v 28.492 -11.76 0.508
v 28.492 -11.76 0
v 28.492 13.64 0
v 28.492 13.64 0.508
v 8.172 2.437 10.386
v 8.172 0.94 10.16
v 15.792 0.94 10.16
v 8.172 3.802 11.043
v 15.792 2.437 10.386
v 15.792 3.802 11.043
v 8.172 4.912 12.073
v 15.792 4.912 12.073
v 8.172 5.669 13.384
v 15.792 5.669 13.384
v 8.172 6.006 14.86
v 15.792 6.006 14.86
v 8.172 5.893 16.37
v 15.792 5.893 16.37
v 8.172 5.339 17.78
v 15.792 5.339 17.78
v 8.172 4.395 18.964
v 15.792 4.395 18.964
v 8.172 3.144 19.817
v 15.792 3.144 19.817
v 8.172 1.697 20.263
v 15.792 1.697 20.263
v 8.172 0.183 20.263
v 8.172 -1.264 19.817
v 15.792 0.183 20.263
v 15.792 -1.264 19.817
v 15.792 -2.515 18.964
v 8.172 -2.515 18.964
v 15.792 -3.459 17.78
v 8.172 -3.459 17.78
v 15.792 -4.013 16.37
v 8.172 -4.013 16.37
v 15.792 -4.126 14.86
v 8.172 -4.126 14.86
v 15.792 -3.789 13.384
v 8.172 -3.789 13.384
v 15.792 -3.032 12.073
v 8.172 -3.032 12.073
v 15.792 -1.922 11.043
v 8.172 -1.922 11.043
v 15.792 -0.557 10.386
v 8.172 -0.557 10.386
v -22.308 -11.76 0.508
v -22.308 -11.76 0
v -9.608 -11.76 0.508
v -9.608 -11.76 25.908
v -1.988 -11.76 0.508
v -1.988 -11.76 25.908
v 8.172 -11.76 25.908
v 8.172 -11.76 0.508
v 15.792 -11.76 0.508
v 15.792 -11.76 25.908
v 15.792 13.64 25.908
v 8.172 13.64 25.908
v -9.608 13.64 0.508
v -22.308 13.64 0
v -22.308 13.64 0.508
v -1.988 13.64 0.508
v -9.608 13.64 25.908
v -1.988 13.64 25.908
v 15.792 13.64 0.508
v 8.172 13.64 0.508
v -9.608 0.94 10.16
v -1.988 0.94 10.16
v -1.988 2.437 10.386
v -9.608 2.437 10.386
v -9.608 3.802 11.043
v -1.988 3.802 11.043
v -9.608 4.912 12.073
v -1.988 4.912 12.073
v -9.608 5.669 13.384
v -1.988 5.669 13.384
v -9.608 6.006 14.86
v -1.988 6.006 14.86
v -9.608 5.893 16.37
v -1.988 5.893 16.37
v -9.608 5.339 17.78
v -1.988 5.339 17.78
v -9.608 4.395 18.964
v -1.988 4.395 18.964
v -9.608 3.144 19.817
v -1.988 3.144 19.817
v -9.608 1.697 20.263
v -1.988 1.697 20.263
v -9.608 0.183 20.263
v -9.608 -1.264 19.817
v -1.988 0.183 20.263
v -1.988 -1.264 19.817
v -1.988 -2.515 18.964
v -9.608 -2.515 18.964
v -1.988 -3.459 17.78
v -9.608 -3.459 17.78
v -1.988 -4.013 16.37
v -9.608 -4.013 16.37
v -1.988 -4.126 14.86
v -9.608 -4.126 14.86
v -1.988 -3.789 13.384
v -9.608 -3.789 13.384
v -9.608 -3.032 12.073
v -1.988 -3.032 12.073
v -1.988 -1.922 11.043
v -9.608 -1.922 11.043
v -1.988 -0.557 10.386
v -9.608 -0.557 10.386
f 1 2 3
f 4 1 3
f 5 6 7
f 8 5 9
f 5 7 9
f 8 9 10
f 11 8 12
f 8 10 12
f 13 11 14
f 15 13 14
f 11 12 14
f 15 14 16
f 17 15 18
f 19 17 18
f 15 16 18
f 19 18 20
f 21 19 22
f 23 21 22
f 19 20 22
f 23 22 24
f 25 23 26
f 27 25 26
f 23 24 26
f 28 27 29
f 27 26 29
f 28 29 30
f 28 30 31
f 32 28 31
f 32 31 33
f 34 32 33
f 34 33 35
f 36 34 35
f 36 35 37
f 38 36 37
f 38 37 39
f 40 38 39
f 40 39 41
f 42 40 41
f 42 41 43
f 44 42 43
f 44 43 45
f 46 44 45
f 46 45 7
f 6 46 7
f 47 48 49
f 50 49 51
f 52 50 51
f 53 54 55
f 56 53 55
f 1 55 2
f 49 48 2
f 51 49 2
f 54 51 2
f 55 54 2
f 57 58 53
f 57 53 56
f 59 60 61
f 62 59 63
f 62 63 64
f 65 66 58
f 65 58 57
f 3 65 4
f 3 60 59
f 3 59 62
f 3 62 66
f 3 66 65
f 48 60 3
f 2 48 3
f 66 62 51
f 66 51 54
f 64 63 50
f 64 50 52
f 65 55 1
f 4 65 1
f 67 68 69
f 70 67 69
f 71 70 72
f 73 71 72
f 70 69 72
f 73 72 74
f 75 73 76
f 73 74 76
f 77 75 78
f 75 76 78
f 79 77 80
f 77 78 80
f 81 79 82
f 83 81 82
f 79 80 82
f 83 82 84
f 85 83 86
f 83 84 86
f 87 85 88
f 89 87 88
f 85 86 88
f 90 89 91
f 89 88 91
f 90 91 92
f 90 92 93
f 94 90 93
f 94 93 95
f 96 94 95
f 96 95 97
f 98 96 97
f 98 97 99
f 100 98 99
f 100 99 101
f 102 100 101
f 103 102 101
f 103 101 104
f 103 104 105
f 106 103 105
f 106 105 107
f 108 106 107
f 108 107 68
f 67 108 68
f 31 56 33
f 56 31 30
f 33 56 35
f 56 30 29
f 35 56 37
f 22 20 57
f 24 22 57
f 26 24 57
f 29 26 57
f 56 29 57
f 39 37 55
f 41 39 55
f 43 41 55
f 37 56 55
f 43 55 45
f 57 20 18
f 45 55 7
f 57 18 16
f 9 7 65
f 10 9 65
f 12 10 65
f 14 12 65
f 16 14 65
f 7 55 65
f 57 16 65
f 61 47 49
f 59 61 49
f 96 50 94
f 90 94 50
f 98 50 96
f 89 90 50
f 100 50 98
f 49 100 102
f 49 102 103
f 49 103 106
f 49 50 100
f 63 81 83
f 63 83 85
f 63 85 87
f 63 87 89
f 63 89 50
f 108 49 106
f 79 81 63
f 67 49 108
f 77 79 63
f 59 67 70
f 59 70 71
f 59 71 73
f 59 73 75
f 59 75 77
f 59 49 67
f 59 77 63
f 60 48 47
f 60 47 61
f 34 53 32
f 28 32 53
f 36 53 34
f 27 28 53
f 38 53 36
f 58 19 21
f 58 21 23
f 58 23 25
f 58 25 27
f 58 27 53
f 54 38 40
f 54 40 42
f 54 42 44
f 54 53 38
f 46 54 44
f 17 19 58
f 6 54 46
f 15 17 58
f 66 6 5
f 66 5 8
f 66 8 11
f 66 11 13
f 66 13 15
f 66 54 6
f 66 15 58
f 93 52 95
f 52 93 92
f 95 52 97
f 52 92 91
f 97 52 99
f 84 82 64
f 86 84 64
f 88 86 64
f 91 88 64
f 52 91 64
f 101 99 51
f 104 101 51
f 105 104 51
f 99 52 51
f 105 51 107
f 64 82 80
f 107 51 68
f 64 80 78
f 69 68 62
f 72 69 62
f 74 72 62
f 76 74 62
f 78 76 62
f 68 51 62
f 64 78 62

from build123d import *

# Parameters (mm, degrees)
SERVO_ROD_HOLDERS_W                 = 25.4
SERVO_ROD_HOLDERS_H                 = 25.4
BASE_OF_THE_HOLDERS_DEPTH           = 0.508
SERVO_ROD_HOLDERS_3_W               = 7.62
SERVO_ROD_HOLDERS_3_H               = 25.4
TWO_HOLDERS_EXTRUDE_DEPTH           = 25.908
SKETCH2_R                           = 5.08
PLACEMENT_FOR_ROD_EXTRUDE_CUT_DEPTH = 25.4
SERVO_ROD_HOLDERS_4_W               = 12.7
SERVO_ROD_HOLDERS_4_H               = 25.4
EXTENSION_FOR_SCREWS_DEPTH          = 0.508


with BuildPart() as part:
    # Servo Rod Holders → Base of the Holders (new body)
    with BuildSketch(Plane.XY):
        with Locations((3.091913881, 0.940064131)):
            Rectangle(SERVO_ROD_HOLDERS_W, SERVO_ROD_HOLDERS_H)
    extrude(amount=BASE_OF_THE_HOLDERS_DEPTH)

    # Servo Rod Holders<3> → Two Holders Extrude (add)
    with BuildSketch(Plane.XY):
        with Locations((-5.798086119, 0.940064131)):
            Rectangle(SERVO_ROD_HOLDERS_3_W, SERVO_ROD_HOLDERS_3_H)
        with Locations((11.981913881, 0.940064131)):
            Rectangle(SERVO_ROD_HOLDERS_3_W, SERVO_ROD_HOLDERS_3_H)
    extrude(amount=TWO_HOLDERS_EXTRUDE_DEPTH)

    # Sketch2 → Placement for Rod Extrude Cut (cut)
    with BuildSketch(Plane(origin=(15.791913881, 0, 0), x_dir=(0, 0, -1), z_dir=(1, 0, 0))):
        with Locations((-15.24, 0.940064131)):
            Circle(SKETCH2_R)
    extrude(amount=-PLACEMENT_FOR_ROD_EXTRUDE_CUT_DEPTH, mode=Mode.SUBTRACT)

    # Servo Rod Holders<4> → Extension for Screws (add)
    with BuildSketch(Plane.XY):
        with Locations((-15.958086119, 0.940064131)):
            Rectangle(SERVO_ROD_HOLDERS_4_W, SERVO_ROD_HOLDERS_4_H)
        with Locations((22.141913881, 0.940064131)):
            Rectangle(SERVO_ROD_HOLDERS_4_W, SERVO_ROD_HOLDERS_4_H)
    extrude(amount=EXTENSION_FOR_SCREWS_DEPTH)


solid = part.part
